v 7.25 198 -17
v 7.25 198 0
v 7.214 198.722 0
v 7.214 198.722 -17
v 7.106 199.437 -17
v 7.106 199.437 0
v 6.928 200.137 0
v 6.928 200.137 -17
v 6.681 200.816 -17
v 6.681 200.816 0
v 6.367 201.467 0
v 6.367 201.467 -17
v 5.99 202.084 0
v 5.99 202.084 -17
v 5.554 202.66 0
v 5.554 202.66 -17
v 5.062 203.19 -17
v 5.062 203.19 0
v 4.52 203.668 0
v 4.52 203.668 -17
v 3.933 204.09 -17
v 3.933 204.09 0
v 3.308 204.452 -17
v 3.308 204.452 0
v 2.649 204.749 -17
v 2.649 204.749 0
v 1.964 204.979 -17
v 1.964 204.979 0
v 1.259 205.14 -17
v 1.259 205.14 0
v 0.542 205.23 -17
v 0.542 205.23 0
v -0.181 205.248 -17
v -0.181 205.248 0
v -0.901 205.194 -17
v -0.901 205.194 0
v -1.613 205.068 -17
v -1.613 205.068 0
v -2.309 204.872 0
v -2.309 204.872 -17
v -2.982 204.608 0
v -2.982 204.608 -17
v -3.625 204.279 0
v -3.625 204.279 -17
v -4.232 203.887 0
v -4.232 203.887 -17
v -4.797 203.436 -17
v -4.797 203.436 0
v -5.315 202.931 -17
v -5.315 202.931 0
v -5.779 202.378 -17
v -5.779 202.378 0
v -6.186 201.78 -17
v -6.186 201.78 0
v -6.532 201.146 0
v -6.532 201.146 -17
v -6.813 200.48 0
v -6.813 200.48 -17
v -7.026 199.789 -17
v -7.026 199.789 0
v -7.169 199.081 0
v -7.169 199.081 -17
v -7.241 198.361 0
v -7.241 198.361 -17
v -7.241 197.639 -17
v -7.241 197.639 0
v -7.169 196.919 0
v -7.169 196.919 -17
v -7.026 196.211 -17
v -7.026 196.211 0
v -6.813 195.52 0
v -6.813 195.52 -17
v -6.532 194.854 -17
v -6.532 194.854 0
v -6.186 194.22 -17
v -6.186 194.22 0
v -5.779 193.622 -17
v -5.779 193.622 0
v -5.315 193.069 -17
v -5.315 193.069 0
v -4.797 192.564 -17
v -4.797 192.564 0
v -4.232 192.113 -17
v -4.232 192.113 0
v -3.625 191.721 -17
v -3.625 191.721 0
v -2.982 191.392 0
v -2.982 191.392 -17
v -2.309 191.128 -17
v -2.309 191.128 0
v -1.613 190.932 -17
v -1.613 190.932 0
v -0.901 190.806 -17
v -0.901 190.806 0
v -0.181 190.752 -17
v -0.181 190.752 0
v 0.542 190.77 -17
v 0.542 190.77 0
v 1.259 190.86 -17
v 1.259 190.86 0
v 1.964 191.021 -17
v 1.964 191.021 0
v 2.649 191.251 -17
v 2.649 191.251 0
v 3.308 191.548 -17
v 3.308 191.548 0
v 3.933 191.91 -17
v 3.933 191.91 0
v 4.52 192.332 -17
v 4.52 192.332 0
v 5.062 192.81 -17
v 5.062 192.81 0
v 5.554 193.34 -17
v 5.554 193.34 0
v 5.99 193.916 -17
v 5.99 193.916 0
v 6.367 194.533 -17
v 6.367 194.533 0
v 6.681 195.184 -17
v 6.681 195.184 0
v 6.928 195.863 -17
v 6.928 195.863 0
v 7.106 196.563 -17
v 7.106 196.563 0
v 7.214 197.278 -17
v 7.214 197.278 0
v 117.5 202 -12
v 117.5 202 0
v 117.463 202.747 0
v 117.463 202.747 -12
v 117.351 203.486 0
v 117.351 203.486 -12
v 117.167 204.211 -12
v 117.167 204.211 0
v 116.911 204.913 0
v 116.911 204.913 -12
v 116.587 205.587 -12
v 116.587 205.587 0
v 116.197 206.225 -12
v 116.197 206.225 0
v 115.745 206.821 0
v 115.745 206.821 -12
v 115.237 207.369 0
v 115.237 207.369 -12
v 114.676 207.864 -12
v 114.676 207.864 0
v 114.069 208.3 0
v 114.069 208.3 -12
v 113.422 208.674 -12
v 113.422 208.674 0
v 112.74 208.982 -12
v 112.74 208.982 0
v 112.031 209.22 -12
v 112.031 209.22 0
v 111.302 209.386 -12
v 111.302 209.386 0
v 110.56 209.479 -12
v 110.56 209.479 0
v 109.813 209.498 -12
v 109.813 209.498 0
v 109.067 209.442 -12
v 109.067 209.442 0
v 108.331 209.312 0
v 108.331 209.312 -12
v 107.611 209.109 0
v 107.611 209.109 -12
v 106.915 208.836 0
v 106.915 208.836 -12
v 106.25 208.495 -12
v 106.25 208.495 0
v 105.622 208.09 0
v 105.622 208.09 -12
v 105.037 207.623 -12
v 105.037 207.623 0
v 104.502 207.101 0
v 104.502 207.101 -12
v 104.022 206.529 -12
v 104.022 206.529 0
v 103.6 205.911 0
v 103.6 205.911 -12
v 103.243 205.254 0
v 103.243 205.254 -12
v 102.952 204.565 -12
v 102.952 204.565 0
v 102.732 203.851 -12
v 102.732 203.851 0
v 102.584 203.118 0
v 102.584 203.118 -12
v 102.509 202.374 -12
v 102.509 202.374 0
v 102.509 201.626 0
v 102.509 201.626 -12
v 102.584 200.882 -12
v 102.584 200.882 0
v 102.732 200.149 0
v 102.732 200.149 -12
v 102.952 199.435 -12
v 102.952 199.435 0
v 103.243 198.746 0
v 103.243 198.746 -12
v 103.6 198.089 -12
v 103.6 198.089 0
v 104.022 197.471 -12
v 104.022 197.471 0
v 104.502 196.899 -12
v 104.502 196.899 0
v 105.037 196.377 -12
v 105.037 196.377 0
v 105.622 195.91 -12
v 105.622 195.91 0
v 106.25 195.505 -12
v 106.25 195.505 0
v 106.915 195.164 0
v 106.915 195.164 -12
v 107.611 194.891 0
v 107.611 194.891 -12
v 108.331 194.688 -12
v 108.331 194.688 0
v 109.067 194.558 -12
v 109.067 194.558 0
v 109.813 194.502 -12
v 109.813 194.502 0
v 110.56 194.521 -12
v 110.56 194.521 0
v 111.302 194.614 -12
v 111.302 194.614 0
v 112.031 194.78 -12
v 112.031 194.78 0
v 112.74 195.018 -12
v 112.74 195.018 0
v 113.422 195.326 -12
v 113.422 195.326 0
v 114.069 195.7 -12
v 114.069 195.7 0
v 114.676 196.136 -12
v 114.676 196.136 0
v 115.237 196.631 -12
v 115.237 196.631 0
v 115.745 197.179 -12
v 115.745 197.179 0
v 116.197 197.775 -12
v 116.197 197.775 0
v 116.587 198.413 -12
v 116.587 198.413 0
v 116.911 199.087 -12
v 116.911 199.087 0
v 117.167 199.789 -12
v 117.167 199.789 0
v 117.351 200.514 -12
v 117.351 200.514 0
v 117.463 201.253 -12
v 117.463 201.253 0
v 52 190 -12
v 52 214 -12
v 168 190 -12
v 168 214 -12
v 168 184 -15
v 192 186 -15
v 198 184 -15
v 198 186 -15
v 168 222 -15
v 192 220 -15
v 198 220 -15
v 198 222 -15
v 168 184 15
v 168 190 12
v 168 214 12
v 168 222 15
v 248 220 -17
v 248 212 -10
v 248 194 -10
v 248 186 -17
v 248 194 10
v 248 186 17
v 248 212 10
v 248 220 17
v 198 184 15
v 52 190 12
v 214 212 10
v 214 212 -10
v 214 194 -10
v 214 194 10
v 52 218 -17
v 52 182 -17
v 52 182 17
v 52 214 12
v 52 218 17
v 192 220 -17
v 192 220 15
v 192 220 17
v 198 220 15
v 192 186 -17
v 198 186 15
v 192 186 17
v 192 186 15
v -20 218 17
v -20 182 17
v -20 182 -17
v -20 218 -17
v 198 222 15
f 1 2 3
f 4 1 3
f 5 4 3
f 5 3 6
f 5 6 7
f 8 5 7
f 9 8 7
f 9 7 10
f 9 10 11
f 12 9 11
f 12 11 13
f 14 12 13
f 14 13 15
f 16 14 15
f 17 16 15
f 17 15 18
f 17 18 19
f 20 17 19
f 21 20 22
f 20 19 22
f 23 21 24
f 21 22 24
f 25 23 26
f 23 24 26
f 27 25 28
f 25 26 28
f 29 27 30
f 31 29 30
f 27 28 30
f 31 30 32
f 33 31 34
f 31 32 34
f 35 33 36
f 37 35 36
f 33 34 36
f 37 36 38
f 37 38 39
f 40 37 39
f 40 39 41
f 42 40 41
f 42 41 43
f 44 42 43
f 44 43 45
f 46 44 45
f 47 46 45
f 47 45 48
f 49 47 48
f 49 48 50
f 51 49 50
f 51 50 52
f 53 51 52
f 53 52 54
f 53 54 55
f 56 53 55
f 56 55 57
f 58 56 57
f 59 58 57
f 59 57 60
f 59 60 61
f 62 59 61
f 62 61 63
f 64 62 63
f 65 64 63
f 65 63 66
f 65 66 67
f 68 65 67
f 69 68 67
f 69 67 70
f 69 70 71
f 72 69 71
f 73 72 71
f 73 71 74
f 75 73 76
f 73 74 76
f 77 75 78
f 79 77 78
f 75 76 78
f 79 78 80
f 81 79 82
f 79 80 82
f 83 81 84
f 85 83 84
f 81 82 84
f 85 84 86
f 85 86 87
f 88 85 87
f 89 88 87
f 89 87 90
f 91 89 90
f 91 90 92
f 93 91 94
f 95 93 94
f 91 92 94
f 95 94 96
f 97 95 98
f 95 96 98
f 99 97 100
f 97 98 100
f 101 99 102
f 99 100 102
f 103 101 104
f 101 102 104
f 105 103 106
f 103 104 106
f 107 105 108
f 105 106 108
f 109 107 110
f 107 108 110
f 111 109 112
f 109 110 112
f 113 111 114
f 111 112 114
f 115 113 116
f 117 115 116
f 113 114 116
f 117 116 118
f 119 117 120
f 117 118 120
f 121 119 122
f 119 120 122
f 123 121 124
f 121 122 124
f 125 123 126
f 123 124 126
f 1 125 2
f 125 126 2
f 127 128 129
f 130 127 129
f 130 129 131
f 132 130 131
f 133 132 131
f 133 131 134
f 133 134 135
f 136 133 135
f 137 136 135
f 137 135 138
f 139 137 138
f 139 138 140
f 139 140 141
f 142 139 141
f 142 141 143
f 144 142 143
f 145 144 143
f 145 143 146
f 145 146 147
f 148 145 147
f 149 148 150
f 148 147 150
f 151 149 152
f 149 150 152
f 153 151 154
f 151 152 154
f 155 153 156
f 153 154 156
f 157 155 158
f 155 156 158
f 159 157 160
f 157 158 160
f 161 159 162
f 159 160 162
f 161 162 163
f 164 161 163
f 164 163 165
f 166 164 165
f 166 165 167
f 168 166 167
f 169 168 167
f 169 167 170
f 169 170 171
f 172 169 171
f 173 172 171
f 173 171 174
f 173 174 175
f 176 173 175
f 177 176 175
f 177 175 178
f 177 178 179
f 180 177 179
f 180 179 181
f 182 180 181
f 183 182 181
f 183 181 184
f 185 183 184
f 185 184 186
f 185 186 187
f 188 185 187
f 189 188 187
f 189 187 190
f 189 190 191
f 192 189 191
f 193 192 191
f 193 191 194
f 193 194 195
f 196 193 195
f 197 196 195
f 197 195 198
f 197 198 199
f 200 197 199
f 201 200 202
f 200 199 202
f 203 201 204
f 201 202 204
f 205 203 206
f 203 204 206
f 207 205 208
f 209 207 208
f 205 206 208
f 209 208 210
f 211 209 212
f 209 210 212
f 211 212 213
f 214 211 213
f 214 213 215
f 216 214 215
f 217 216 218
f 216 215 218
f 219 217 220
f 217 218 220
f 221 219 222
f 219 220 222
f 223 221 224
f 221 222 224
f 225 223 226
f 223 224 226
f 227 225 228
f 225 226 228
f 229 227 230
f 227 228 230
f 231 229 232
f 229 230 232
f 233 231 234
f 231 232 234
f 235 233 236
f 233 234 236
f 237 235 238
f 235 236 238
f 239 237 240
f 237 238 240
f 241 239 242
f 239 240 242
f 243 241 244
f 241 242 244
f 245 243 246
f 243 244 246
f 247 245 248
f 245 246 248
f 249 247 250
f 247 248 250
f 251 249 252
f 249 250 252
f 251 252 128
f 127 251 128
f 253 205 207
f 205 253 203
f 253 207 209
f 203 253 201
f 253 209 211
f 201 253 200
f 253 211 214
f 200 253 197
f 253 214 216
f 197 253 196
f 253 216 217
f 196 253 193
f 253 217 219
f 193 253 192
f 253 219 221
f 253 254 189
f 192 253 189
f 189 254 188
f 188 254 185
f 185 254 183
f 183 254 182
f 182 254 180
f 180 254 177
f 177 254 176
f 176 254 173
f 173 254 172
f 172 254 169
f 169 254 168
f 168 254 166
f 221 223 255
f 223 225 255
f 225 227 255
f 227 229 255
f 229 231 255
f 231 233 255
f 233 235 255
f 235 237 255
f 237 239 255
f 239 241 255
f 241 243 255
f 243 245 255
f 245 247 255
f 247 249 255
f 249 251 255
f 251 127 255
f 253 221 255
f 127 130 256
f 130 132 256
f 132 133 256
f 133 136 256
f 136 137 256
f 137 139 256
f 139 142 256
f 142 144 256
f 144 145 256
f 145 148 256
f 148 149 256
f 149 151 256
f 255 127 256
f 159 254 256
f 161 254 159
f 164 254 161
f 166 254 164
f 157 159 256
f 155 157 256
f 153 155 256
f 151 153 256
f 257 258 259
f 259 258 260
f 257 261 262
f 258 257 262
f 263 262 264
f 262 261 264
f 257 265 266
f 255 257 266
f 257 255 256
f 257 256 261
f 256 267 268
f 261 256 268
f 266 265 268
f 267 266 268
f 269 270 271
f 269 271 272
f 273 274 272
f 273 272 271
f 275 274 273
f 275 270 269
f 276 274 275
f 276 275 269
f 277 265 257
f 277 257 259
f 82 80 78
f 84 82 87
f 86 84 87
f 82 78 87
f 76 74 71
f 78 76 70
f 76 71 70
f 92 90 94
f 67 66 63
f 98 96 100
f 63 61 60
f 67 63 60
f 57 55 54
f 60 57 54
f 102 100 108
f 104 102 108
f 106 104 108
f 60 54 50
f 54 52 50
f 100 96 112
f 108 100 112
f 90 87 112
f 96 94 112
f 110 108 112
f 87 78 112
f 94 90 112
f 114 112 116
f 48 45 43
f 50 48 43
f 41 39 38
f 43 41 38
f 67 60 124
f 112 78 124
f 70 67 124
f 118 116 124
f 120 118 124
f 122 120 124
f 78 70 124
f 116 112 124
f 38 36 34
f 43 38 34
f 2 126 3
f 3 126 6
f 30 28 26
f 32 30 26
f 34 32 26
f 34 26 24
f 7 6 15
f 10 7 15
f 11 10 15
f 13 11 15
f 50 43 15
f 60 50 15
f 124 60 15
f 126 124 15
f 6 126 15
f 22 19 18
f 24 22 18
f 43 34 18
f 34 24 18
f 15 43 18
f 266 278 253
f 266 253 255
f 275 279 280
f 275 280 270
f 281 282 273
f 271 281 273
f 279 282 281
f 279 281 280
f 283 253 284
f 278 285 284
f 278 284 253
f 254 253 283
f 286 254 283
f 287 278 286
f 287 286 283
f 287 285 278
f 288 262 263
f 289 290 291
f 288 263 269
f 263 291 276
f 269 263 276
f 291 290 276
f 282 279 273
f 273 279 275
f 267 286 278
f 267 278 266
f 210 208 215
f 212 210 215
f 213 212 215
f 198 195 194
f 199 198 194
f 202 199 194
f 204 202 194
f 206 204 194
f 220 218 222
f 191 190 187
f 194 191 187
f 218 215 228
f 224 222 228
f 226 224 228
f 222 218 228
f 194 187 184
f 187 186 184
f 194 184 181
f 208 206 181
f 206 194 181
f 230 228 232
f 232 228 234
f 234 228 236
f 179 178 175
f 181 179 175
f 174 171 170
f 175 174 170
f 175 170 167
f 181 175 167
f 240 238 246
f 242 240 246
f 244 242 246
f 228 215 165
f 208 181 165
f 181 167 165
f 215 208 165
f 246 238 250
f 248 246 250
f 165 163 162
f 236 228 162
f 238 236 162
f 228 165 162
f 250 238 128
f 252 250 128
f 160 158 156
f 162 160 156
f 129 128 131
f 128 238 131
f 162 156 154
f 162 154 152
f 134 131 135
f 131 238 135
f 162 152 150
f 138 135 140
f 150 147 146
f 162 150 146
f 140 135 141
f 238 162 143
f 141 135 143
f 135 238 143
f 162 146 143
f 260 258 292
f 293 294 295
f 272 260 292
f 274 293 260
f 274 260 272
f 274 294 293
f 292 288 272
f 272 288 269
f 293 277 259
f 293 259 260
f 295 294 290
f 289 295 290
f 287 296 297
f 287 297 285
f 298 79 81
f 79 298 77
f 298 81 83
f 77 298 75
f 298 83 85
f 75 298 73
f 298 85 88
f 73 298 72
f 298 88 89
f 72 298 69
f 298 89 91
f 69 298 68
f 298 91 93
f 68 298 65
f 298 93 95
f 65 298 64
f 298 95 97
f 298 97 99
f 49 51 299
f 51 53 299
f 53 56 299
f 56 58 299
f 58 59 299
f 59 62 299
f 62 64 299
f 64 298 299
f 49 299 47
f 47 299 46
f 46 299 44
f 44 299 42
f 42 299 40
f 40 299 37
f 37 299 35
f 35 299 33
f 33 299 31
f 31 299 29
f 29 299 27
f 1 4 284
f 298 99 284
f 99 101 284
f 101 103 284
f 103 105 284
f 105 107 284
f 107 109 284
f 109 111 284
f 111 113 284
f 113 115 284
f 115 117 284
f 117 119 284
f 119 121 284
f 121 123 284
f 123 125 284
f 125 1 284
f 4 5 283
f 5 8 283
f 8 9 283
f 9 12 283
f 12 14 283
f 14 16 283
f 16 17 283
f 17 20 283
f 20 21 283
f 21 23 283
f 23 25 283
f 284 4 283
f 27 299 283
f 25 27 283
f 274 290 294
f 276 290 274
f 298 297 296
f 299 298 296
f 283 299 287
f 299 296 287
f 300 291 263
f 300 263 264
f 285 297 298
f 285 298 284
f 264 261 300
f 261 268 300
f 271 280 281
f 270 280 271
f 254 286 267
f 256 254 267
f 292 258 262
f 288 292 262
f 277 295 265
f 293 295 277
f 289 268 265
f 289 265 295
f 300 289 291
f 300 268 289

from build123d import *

# Parameters (mm, degrees)
SKETCH1_W           = 72
SKETCH1_H           = 36
BOSS_EXTRUDE1_DEPTH = 17
SKETCH2_W           = 124
SKETCH2_H           = 24
BOSS_EXTRUDE2_DEPTH = 12
SKETCH3_W           = 30
SKETCH3_H           = 38
BOSS_EXTRUDE3_DEPTH = 15
SKETCH4_W           = 56
SKETCH4_H           = 34
BOSS_EXTRUDE4_DEPTH = 17
SKETCH5_W           = 38
SKETCH5_H           = 18
CUT_EXTRUDE1_DEPTH  = 10
SKETCH6_R           = 7.25
CUT_EXTRUDE2_DEPTH  = 334.282162739
SKETCH7_R           = 7.5
CUT_EXTRUDE3_DEPTH  = 334.282162739


with BuildPart() as part:
    # Sketch1 → Boss-Extrude1 (new, symmetric)
    with BuildSketch(Plane.XY):
        with Locations((16, 200)):
            Rectangle(SKETCH1_W, SKETCH1_H)
    extrude(amount=BOSS_EXTRUDE1_DEPTH, both=True)

    # Sketch2 → Boss-Extrude2 (add, symmetric)
    with BuildSketch(Plane.XY):
        with Locations((110, 202)):
            Rectangle(SKETCH2_W, SKETCH2_H)
    extrude(amount=BOSS_EXTRUDE2_DEPTH, both=True)

    # Sketch3 → Boss-Extrude3 (add, symmetric)
    with BuildSketch(Plane.XY):
        with Locations((183, 203)):
            Rectangle(SKETCH3_W, SKETCH3_H)
    extrude(amount=BOSS_EXTRUDE3_DEPTH, both=True)

    # Sketch4 → Boss-Extrude4 (add, symmetric)
    with BuildSketch(Plane.XY):
        with Locations((220, 203)):
            Rectangle(SKETCH4_W, SKETCH4_H)
    extrude(amount=BOSS_EXTRUDE4_DEPTH, both=True)

    # Sketch5 → Cut-Extrude1 (cut, symmetric)
    with BuildSketch(Plane.XY):
        with Locations((233, 203)):
            Rectangle(SKETCH5_W, SKETCH5_H)
    extrude(amount=CUT_EXTRUDE1_DEPTH, both=True, mode=Mode.SUBTRACT)

    # Sketch6 → Cut-Extrude2 (cut, through all)
    with BuildSketch(Plane.XY):
        with Locations((0, 198)):
            Circle(SKETCH6_R)
    extrude(amount=-CUT_EXTRUDE2_DEPTH, mode=Mode.SUBTRACT)

    # Sketch7 → Cut-Extrude3 (cut, through all)
    with BuildSketch(Plane.XY):
        with Locations((110, 202)):
            Circle(SKETCH7_R)
    extrude(amount=-CUT_EXTRUDE3_DEPTH, mode=Mode.SUBTRACT)


solid = part.part
